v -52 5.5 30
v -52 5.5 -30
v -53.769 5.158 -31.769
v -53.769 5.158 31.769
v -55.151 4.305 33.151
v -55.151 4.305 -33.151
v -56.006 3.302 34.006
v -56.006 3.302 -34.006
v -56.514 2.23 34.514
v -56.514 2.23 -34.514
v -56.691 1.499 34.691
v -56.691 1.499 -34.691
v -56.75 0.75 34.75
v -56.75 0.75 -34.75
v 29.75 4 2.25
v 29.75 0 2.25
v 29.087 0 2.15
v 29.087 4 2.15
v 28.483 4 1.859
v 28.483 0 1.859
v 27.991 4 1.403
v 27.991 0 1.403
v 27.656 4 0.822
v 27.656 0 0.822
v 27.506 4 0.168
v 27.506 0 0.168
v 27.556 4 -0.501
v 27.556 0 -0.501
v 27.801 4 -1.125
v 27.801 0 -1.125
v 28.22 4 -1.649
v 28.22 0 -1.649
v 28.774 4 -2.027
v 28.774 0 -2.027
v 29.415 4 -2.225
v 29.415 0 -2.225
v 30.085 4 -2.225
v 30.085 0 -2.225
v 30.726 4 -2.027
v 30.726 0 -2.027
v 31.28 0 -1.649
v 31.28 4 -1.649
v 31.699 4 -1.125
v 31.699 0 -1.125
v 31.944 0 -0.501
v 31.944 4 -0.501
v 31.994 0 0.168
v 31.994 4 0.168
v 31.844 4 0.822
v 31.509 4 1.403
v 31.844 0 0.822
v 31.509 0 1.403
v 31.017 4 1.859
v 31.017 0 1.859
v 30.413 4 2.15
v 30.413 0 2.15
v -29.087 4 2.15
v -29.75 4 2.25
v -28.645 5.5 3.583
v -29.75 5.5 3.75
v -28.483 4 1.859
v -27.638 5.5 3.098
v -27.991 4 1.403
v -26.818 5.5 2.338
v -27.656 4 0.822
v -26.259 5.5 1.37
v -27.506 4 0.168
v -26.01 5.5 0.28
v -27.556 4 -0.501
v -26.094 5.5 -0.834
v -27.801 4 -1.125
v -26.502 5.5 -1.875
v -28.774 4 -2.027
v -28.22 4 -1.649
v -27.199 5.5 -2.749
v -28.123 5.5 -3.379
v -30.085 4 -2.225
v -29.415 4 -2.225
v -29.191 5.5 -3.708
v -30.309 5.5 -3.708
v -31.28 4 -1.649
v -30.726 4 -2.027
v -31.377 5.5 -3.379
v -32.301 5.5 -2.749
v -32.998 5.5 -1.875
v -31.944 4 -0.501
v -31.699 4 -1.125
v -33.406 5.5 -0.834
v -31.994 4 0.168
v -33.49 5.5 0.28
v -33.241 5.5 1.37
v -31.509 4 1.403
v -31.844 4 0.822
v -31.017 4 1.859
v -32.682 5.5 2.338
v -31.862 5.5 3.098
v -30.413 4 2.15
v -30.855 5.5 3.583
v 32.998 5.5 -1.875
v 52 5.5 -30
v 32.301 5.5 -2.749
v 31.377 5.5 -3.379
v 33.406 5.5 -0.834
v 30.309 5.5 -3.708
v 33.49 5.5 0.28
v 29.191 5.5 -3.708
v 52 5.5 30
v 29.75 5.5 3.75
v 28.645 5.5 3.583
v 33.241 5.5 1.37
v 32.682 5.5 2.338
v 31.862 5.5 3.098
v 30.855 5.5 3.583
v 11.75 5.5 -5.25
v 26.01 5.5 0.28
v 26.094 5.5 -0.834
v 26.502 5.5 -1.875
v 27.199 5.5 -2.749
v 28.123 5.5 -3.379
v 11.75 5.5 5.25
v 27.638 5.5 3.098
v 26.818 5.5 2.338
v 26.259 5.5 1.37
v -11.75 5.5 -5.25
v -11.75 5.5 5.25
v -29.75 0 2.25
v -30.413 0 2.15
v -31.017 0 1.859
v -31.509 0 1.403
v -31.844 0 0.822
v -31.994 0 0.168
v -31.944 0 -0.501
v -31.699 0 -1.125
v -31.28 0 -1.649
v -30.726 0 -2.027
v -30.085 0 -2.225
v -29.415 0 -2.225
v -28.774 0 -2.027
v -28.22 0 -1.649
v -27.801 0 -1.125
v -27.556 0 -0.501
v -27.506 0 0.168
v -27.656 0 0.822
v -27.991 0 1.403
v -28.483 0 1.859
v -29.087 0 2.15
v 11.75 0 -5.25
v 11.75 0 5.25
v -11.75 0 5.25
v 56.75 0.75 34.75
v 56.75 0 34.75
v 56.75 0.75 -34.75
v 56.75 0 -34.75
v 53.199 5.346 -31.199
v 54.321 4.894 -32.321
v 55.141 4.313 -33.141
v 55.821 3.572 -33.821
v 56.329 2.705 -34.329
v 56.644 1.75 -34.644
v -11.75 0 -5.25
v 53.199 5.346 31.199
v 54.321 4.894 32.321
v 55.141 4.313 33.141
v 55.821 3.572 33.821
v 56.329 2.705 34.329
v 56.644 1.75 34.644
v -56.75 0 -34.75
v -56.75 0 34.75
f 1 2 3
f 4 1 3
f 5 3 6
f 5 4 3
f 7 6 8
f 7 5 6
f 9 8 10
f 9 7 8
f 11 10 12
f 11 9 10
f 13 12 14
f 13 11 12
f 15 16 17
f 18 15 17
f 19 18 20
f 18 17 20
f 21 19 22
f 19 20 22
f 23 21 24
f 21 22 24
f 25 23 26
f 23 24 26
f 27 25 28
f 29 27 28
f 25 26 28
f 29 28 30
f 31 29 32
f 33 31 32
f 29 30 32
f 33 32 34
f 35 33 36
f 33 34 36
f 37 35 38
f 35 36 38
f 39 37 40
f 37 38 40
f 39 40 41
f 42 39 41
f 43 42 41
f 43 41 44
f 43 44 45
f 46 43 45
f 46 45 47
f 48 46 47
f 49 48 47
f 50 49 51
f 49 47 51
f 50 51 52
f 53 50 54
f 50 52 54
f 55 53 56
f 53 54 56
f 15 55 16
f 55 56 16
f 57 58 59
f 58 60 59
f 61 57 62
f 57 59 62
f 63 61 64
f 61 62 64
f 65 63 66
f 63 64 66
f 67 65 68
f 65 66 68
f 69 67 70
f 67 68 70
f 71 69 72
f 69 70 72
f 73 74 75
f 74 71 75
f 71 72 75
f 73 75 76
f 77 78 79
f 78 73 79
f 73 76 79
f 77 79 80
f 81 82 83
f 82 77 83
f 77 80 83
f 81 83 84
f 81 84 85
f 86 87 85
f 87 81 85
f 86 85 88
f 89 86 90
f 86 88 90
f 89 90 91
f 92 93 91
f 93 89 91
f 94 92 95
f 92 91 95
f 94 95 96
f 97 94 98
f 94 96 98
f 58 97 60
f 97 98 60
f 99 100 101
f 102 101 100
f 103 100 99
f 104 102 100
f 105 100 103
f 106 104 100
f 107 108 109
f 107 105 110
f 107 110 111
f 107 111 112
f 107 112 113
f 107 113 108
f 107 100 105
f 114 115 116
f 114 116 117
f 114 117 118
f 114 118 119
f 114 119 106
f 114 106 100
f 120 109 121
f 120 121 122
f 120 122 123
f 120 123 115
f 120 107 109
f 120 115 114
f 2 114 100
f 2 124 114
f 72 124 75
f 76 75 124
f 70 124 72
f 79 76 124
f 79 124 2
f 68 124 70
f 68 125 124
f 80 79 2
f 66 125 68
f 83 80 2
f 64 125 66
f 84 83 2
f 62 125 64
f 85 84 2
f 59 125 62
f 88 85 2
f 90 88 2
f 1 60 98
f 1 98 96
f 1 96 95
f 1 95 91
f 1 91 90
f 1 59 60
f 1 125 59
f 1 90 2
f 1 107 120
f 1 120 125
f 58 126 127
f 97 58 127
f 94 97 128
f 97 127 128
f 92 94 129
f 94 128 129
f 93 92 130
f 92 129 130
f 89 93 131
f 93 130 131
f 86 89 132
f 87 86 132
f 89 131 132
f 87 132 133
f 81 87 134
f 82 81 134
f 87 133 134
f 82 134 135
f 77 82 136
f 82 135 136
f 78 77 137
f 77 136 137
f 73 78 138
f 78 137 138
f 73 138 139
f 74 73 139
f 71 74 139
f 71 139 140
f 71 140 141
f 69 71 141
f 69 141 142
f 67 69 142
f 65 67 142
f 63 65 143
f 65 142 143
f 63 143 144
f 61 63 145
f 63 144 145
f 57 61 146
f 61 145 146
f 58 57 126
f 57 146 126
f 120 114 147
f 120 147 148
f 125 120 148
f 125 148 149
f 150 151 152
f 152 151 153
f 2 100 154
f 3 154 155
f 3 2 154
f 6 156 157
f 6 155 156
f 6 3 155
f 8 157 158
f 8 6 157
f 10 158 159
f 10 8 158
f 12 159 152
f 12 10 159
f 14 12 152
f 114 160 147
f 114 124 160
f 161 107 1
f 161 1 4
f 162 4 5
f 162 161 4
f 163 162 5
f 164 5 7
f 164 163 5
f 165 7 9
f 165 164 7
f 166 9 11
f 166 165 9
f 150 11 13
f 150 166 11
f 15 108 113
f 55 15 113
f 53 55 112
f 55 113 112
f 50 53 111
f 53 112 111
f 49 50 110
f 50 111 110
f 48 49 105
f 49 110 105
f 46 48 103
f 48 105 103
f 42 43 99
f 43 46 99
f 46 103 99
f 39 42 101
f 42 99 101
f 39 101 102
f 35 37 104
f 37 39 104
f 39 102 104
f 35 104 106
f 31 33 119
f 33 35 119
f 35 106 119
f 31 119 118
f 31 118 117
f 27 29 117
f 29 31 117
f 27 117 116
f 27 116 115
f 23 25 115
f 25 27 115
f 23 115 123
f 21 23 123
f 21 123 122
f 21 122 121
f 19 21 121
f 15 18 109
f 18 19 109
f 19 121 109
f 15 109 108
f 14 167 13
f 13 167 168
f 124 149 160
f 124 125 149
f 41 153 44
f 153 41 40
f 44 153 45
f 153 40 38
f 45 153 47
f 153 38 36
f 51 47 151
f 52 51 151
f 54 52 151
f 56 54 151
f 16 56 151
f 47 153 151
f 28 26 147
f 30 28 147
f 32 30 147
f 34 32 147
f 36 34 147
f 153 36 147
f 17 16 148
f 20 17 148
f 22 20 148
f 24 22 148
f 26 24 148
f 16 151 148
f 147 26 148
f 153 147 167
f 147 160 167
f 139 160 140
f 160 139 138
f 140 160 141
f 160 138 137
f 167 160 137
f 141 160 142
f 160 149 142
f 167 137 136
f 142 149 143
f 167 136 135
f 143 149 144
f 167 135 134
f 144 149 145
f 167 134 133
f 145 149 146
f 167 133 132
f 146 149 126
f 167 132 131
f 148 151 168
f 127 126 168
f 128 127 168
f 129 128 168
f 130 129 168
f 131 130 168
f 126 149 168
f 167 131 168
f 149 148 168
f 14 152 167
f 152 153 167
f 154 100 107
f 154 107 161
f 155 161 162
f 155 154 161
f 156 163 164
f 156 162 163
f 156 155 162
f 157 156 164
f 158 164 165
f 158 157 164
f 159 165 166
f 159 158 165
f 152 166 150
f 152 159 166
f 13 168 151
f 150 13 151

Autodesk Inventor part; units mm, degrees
ref_plane "YZ Plane" through (0, 0, 0) normal (1, 0, 0) x (0, 1, 0)
ref_plane "XZ Plane" through (0, 0, 0) normal (0, 1, 0) x (-1, 0, 0)
ref_plane "XY Plane" through (0, 0, 0) normal (0, 0, 1) x (1, 0, 0)
sketch "Sketch1" plane through (0, 0, 0) normal (0, 1, 0) x (-1, 0, 0)
  line L0 (-56.75, -34.75) -> (56.75, -34.75)
  line L1 (56.75, -34.75) -> (56.75, 34.75)
  line L2 (56.75, 34.75) -> (-56.75, 34.75)
  line L3 (-56.75, 34.75) -> (-56.75, -34.75)
  line L4 (-56.75, -34.75) -> (56.75, 34.75) construction
  line L5 (56.75, -34.75) -> (-56.75, 34.75) construction
  point P0 (0, 0)
  dimension "d0" = 113.5
  dimension "d1" = 69.5
extrude "Extrusion1" add sketch "Sketch1" along normal blind 5.5
sketch "Sketch2" plane through (0, 5.5, 0) normal (0, 1, 0) x (1, 0, 0)
  line L0 (56.75, 34.75) -> (-56.75, 34.75) projected
  line L1 (-56.75, 34.75) -> (-56.75, -34.75) projected
  line L2 (-56.75, -34.75) -> (56.75, -34.75) projected
  line L3 (56.75, -34.75) -> (56.75, 34.75) projected
  line L4 (11.75, -5.25) -> (-11.75, -5.25)
  line L5 (-11.75, -5.25) -> (-11.75, 5.25)
  line L6 (-11.75, 5.25) -> (11.75, 5.25)
  line L7 (11.75, 5.25) -> (11.75, -5.25)
  line L8 (11.75, -5.25) -> (-11.75, 5.25) construction
  line L9 (-11.75, -5.25) -> (11.75, 5.25) construction
  point P0 (0, 0)
  dimension "d4" = 45
  dimension "d5" = 29.5
extrude "Extrusion2" cut sketch "Sketch2" against normal up to next contours L4 L5 L6 L7
sketch "Sketch3" plane through (0, 5.5, 0) normal (0, 1, 0) x (1, 0, 0)
  line L0 (11.75, 5.25) -> (11.75, -5.25) projected
  line L1 (11.75, 0) -> (29.75, 0)
  line L2 (-11.75, 5.25) -> (-11.75, -5.25) projected
  line L3 (-11.75, 0) -> (-29.75, 0)
  point P0 (0, 0)
  dimension "d8" = 18
hole "Hole1" at (-29.75, 5.5, 0) at (29.75, 5.5, 0) direction (0, -1, 0) diameter 4.5 depth 10 tip angle 118 countersink diameter 7.5 countersink angle 90
fillet "Fillet1" radius 4.75 4 edges at (-56.75, 5.5, 0) (56.75, 5.5, 0) (0, 5.5, 34.75) (0, 5.5, -34.75)
properties part number "Plate"
